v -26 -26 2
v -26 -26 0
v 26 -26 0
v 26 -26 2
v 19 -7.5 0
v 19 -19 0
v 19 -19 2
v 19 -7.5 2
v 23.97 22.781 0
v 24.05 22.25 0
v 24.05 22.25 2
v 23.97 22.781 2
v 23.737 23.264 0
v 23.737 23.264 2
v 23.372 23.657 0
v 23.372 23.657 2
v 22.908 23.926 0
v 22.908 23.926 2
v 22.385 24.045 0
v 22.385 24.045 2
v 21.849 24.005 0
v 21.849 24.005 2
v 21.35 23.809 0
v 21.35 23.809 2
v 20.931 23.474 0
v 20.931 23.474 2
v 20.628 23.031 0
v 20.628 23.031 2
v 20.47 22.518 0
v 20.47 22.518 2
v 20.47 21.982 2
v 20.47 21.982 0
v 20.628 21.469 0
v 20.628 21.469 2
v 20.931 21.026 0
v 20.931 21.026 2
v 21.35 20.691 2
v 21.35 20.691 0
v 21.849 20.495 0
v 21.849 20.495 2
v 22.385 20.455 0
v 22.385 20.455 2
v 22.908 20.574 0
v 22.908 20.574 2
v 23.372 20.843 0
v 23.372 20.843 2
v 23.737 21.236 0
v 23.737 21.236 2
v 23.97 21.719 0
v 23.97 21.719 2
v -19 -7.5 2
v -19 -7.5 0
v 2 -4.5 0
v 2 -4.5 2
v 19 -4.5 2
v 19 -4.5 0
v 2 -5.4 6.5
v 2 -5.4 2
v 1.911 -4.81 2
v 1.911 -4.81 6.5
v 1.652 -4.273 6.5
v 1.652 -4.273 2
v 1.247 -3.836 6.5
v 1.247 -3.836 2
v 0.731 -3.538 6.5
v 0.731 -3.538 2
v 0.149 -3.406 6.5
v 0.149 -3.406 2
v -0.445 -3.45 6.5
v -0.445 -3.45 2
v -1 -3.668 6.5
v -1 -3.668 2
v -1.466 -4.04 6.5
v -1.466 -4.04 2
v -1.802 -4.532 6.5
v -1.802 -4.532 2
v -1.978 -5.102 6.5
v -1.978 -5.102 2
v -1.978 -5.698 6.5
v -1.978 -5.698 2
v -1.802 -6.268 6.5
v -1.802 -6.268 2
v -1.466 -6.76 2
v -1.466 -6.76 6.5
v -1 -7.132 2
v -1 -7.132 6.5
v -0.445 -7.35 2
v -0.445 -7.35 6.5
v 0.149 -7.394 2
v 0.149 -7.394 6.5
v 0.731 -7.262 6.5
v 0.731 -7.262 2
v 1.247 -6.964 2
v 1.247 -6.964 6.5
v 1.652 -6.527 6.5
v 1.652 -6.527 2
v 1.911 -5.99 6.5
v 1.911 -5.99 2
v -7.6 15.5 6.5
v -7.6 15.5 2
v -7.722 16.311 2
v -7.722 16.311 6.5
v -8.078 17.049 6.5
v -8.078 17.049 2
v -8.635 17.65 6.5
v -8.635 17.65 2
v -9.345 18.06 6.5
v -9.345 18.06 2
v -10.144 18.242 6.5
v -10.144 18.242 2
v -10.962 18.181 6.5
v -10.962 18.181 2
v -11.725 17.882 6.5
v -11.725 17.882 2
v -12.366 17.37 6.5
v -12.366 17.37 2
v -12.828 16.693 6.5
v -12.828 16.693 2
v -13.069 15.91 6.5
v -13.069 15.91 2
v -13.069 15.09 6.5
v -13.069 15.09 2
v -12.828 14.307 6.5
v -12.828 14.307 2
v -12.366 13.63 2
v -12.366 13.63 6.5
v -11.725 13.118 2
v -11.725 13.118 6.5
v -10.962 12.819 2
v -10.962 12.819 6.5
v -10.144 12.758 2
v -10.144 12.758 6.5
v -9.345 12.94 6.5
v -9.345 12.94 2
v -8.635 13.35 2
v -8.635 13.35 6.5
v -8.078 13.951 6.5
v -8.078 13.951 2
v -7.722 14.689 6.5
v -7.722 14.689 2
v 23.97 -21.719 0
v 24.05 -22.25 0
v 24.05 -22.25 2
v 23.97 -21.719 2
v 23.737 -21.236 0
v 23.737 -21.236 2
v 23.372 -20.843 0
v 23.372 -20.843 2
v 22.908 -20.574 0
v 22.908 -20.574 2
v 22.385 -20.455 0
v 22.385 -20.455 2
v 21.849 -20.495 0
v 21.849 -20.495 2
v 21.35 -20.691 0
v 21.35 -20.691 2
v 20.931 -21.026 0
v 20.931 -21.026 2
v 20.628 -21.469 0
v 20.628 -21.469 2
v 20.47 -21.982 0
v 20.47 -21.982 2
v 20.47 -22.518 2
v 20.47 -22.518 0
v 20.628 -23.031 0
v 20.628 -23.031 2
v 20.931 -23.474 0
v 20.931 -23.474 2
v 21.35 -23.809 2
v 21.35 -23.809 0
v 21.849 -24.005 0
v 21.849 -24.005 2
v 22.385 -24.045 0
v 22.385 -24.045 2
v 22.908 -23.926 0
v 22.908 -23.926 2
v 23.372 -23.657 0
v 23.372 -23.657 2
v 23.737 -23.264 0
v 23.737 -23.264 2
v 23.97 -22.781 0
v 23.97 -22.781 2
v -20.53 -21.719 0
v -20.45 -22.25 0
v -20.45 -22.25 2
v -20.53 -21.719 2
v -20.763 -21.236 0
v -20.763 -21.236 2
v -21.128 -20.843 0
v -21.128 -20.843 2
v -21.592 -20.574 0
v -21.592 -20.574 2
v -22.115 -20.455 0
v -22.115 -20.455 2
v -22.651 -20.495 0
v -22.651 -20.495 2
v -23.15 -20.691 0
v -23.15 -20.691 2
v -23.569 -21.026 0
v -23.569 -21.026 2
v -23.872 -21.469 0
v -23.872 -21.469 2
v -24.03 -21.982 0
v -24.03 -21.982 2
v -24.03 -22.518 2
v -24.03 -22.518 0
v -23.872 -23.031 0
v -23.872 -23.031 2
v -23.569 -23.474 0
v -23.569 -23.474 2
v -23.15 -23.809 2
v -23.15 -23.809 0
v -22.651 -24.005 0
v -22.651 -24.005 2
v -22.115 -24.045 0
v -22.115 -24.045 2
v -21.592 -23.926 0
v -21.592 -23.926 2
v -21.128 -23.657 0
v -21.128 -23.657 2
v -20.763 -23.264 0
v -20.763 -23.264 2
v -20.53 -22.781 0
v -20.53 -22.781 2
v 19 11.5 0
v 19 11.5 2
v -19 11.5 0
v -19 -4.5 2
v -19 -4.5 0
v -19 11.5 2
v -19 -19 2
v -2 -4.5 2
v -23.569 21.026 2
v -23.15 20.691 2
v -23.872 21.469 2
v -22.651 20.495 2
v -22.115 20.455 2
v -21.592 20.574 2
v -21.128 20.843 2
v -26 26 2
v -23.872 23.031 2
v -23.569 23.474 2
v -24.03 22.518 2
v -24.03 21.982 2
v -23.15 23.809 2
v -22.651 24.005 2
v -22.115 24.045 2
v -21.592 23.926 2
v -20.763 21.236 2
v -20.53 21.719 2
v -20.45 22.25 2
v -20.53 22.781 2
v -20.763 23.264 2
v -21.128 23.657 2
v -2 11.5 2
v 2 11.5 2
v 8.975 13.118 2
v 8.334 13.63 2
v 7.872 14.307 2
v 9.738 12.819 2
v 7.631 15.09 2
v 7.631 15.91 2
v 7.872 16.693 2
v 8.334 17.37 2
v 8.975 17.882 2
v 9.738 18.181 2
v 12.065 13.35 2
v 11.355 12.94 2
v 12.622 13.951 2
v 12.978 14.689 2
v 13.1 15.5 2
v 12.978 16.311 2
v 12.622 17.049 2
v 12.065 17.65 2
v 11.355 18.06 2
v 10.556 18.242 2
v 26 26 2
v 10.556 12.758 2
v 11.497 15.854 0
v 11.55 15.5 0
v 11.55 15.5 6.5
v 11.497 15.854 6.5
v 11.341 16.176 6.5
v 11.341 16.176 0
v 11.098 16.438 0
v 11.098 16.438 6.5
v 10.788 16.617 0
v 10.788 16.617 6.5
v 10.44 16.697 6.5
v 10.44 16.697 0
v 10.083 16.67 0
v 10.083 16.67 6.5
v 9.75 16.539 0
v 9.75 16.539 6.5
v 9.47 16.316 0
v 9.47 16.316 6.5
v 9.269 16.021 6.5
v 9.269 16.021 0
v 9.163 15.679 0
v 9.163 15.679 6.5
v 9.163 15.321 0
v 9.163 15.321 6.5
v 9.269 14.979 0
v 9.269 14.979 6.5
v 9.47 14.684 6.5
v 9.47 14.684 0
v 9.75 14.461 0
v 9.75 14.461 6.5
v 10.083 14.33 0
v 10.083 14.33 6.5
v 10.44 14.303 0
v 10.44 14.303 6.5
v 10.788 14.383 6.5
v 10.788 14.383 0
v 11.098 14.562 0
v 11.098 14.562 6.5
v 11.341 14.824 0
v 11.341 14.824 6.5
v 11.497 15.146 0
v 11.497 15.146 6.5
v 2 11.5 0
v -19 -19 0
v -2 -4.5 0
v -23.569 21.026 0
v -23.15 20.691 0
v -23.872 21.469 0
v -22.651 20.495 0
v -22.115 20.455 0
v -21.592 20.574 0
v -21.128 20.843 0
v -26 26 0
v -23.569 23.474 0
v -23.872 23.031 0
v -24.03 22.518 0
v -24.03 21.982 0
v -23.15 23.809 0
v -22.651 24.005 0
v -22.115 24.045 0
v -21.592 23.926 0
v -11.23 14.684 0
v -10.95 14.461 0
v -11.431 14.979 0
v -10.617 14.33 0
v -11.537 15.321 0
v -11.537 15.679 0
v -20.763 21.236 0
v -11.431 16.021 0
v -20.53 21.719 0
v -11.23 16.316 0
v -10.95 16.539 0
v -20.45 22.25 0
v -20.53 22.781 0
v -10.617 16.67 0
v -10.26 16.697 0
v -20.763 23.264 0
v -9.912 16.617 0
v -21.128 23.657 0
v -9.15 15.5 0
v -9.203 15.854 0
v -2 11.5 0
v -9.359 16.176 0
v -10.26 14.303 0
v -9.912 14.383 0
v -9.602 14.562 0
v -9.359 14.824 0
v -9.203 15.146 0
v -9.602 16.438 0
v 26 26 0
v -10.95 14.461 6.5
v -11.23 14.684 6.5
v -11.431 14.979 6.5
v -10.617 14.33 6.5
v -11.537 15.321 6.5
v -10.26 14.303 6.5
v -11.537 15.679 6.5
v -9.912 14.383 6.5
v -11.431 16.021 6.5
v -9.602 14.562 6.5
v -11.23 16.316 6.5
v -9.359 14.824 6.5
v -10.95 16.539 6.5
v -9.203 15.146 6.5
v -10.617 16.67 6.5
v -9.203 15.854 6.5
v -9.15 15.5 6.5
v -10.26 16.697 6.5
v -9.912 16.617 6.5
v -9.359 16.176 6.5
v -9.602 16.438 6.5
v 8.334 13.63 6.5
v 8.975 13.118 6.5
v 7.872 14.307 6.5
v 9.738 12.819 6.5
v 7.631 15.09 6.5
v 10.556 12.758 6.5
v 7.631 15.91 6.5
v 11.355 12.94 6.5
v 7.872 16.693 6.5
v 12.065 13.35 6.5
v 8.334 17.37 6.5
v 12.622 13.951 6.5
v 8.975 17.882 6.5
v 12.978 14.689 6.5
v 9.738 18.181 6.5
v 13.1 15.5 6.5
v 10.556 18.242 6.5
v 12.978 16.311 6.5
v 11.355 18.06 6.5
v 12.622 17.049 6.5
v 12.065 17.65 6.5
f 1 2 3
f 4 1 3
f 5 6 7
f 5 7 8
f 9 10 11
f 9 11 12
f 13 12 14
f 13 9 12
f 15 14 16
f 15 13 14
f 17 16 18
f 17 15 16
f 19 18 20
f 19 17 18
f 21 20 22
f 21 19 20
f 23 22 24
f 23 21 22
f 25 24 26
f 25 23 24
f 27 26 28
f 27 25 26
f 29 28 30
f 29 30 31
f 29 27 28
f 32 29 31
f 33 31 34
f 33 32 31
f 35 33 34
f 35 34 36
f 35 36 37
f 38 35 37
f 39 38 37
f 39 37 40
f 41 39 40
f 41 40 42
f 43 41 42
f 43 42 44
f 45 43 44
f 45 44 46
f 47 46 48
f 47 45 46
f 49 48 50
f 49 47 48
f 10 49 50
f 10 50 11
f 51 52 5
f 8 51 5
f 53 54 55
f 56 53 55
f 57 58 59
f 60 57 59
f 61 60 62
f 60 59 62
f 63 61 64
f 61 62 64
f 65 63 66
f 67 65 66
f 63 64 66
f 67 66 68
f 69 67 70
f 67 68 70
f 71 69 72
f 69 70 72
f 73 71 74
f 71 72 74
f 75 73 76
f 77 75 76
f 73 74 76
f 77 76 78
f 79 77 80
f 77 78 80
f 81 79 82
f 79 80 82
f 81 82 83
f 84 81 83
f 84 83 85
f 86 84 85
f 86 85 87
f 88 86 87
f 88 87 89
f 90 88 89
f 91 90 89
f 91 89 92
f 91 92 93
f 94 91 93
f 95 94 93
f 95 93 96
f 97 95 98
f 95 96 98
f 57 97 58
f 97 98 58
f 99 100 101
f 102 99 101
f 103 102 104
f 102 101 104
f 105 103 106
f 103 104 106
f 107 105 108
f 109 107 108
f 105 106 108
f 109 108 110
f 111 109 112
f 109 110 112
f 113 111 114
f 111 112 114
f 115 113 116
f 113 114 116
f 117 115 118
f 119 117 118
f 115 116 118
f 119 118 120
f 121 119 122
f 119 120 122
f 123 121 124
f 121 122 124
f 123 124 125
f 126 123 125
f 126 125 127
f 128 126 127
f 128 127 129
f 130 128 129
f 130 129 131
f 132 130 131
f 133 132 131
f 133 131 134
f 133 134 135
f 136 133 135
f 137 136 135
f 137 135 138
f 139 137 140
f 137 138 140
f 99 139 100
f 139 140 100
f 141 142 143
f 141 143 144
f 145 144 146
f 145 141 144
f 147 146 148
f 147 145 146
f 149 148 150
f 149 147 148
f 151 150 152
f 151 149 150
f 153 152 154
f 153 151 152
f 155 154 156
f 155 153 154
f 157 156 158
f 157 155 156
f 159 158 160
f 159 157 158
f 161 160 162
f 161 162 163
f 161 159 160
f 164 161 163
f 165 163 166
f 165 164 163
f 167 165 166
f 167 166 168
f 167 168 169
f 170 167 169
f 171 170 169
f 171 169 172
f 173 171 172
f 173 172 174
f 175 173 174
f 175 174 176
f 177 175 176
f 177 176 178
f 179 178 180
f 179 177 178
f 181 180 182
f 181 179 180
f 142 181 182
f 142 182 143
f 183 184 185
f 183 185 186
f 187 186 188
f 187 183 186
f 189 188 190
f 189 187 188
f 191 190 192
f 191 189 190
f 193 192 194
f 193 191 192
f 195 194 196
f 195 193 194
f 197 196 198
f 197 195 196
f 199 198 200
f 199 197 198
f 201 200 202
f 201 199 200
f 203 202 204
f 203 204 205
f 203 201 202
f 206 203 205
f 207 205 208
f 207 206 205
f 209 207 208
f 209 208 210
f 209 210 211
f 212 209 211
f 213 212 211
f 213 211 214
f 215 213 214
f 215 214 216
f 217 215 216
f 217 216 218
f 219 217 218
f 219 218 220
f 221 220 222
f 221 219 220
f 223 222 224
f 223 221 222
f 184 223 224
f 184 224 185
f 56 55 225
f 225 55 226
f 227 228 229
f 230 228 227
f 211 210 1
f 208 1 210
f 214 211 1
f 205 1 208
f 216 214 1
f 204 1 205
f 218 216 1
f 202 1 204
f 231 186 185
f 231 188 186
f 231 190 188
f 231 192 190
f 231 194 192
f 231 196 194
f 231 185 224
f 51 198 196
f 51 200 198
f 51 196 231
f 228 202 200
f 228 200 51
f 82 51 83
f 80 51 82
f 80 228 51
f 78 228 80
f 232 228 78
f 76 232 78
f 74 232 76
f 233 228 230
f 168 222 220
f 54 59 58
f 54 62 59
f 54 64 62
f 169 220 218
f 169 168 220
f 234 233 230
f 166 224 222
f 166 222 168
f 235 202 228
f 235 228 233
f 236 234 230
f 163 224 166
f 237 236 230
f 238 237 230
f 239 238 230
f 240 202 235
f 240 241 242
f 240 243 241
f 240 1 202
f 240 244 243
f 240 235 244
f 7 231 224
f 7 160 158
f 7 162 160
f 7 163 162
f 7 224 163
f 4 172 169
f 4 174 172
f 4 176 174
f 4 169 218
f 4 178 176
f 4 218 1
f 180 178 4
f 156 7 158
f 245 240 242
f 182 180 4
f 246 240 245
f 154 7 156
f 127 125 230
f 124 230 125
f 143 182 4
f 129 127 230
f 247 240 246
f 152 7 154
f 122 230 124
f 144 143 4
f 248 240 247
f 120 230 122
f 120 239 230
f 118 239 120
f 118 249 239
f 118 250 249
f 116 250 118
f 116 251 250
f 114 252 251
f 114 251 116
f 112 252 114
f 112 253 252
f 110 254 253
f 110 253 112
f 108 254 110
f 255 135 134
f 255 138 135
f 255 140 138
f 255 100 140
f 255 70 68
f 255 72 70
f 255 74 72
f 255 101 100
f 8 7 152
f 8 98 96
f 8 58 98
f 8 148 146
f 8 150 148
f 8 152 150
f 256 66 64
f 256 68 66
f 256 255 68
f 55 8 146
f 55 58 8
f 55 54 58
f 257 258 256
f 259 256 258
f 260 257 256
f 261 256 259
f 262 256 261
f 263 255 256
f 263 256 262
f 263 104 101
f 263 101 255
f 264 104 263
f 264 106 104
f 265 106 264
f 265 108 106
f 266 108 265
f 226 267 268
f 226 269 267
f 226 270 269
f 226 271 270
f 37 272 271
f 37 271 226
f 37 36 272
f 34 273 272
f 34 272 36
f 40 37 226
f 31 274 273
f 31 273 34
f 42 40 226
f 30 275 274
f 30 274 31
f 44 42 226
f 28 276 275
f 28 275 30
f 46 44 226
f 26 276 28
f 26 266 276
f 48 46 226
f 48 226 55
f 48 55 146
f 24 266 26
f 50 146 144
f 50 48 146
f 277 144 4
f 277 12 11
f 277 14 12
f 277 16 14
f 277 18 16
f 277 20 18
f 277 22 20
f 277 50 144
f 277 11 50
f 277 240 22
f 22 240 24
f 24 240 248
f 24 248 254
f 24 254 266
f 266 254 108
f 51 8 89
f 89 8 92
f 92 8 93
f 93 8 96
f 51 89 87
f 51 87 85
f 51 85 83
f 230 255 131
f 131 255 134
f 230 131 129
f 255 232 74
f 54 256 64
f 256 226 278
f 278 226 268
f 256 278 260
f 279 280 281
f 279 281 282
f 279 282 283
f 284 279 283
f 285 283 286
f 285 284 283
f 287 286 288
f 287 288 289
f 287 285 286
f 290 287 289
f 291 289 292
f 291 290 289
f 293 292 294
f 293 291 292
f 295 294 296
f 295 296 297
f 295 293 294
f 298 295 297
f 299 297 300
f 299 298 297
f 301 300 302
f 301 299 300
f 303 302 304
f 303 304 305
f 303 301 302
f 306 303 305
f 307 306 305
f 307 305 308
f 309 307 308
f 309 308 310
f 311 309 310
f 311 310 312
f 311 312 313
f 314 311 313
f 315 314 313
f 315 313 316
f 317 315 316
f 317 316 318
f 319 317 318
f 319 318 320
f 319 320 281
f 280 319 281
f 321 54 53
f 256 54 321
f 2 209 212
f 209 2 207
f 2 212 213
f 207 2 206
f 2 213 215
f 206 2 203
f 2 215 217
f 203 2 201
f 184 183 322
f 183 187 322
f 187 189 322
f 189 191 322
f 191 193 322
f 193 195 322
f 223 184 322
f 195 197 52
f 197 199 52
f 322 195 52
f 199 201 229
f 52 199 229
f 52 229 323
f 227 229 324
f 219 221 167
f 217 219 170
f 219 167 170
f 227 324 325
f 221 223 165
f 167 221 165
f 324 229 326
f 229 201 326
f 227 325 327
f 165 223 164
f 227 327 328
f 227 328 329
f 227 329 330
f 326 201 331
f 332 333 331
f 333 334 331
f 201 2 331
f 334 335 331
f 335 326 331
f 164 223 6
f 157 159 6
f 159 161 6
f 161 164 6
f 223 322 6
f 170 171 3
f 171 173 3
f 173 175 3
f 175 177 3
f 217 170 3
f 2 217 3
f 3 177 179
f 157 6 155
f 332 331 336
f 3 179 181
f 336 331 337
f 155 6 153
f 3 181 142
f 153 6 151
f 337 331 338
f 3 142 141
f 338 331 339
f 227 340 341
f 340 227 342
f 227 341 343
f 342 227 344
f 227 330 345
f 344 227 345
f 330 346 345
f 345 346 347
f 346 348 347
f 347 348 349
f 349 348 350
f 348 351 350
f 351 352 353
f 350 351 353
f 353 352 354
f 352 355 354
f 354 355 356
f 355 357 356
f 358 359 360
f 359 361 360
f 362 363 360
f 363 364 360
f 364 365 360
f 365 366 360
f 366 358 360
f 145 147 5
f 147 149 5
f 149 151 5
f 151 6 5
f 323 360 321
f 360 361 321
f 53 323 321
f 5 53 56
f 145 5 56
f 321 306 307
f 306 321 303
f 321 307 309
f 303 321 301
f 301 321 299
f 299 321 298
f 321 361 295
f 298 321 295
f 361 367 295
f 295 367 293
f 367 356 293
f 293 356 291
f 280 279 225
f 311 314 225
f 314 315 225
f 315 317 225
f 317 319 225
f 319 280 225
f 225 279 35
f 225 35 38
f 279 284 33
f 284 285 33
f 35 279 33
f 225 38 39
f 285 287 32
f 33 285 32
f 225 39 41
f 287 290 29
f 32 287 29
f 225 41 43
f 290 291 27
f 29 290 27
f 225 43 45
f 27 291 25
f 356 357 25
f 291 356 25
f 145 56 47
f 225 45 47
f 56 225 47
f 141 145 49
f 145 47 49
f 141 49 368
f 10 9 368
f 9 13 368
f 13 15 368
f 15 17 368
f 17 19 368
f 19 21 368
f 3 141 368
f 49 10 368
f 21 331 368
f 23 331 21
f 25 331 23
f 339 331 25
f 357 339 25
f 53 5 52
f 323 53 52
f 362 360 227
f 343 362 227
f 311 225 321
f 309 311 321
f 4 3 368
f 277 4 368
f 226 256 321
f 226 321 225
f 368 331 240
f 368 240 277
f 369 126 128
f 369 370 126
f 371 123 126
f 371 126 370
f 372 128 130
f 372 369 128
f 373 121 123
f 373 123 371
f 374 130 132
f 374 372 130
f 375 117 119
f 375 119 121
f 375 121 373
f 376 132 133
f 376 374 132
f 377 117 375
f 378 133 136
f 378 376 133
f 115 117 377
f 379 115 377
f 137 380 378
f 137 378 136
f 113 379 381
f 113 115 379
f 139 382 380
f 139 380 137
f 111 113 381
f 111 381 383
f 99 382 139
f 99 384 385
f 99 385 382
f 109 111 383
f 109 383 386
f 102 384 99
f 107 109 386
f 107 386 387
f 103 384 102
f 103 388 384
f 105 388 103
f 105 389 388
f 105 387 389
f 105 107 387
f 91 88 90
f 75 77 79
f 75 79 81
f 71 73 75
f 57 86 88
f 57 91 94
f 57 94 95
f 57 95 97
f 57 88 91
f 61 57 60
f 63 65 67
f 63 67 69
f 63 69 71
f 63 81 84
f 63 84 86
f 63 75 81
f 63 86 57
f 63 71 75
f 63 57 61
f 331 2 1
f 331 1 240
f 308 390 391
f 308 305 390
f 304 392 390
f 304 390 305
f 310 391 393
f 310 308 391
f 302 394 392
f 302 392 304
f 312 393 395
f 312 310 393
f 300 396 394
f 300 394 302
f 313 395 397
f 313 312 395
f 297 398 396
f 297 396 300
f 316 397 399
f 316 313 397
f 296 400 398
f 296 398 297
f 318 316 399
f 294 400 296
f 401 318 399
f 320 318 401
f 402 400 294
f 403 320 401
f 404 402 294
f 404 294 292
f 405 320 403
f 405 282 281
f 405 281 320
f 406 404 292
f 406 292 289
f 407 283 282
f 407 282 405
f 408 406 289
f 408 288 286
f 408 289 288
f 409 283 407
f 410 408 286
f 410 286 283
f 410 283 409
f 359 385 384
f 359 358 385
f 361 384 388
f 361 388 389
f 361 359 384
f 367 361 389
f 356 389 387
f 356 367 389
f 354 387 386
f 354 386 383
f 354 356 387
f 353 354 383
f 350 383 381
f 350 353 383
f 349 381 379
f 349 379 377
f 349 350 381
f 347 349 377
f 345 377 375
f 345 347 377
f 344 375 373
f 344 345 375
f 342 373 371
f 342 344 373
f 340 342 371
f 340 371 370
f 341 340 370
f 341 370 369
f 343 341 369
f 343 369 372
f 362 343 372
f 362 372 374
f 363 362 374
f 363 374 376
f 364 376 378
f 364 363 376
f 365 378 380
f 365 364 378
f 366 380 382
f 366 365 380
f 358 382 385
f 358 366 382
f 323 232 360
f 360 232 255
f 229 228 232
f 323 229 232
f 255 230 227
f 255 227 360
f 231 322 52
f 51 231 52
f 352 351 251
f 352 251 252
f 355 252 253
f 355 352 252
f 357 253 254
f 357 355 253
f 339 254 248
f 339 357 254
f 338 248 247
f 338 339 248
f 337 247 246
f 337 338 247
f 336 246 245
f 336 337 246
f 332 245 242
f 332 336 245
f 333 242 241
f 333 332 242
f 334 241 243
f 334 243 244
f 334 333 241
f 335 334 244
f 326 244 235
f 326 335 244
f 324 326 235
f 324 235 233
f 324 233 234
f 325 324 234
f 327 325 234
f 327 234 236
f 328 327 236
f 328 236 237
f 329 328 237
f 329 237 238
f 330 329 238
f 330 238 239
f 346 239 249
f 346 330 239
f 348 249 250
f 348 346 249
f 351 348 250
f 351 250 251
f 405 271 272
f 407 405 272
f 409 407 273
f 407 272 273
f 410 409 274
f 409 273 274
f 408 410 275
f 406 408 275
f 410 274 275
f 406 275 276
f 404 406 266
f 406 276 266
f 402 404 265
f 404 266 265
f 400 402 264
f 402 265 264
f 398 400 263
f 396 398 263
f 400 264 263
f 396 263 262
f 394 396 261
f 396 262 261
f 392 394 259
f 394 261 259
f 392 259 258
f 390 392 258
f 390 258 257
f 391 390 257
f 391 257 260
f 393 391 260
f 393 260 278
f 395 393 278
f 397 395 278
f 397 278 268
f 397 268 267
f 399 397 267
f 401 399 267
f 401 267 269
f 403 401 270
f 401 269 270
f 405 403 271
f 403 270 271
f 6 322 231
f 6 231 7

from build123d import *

# Parameters (mm, degrees)
SKETCH_W      = 52
SKETCH_H      = 52
SKETCH_R      = 1.8
SKETCH_R_2    = 1.2
SKETCH_W_2    = 38
SKETCH_H_2    = 11.5
PAD_DEPTH     = 2
SKETCH001_R   = 2
SKETCH001_R_2 = 2.75
SKETCH001_R_3 = 1.2
PAD001_DEPTH  = 4.5
SKETCH002_W   = 17
SKETCH002_H   = 16
POCKET_DEPTH  = 5


with BuildPart() as part:
    # Sketch → Pad (new body)
    with BuildSketch(Plane.XY):
        Rectangle(SKETCH_W, SKETCH_H)
        with Locations((22.25, 22.25)):
            Circle(SKETCH_R, mode=Mode.SUBTRACT)
        with Locations((22.25, -22.25)):
            Circle(SKETCH_R, mode=Mode.SUBTRACT)
        with Locations((-22.25, 22.25)):
            Circle(SKETCH_R, mode=Mode.SUBTRACT)
        with Locations((-22.25, -22.25)):
            Circle(SKETCH_R, mode=Mode.SUBTRACT)
        with Locations((-10.35, 15.5)):
            Circle(SKETCH_R_2, mode=Mode.SUBTRACT)
        with Locations((10.35, 15.5)):
            Circle(SKETCH_R_2, mode=Mode.SUBTRACT)
        with Locations((0, -13.25)):
            Rectangle(SKETCH_W_2, SKETCH_H_2, mode=Mode.SUBTRACT)
    extrude(amount=PAD_DEPTH)

    # Sketch001 → Pad001 (new body)
    with BuildSketch(Plane.XY.offset(2)):
        with Locations((0, -5.4)):
            Circle(SKETCH001_R)
        with Locations((-10.35, 15.5)):
            Circle(SKETCH001_R_2)
        with Locations((-10.35, 15.5)):
            Circle(SKETCH001_R_3, mode=Mode.SUBTRACT)
        with Locations((10.35, 15.5)):
            Circle(SKETCH001_R_2)
        with Locations((10.35, 15.5)):
            Circle(SKETCH001_R_3, mode=Mode.SUBTRACT)
    extrude(amount=PAD001_DEPTH)

    # Sketch002 → Pocket (cut)
    with BuildSketch(Plane.XY.offset(2)):
        with Locations((-10.5, 3.5)):
            Rectangle(SKETCH002_W, SKETCH002_H)
        with Locations((10.5, 3.5)):
            Rectangle(SKETCH002_W, SKETCH002_H)
    extrude(amount=-POCKET_DEPTH, mode=Mode.SUBTRACT)


solid = part.part
